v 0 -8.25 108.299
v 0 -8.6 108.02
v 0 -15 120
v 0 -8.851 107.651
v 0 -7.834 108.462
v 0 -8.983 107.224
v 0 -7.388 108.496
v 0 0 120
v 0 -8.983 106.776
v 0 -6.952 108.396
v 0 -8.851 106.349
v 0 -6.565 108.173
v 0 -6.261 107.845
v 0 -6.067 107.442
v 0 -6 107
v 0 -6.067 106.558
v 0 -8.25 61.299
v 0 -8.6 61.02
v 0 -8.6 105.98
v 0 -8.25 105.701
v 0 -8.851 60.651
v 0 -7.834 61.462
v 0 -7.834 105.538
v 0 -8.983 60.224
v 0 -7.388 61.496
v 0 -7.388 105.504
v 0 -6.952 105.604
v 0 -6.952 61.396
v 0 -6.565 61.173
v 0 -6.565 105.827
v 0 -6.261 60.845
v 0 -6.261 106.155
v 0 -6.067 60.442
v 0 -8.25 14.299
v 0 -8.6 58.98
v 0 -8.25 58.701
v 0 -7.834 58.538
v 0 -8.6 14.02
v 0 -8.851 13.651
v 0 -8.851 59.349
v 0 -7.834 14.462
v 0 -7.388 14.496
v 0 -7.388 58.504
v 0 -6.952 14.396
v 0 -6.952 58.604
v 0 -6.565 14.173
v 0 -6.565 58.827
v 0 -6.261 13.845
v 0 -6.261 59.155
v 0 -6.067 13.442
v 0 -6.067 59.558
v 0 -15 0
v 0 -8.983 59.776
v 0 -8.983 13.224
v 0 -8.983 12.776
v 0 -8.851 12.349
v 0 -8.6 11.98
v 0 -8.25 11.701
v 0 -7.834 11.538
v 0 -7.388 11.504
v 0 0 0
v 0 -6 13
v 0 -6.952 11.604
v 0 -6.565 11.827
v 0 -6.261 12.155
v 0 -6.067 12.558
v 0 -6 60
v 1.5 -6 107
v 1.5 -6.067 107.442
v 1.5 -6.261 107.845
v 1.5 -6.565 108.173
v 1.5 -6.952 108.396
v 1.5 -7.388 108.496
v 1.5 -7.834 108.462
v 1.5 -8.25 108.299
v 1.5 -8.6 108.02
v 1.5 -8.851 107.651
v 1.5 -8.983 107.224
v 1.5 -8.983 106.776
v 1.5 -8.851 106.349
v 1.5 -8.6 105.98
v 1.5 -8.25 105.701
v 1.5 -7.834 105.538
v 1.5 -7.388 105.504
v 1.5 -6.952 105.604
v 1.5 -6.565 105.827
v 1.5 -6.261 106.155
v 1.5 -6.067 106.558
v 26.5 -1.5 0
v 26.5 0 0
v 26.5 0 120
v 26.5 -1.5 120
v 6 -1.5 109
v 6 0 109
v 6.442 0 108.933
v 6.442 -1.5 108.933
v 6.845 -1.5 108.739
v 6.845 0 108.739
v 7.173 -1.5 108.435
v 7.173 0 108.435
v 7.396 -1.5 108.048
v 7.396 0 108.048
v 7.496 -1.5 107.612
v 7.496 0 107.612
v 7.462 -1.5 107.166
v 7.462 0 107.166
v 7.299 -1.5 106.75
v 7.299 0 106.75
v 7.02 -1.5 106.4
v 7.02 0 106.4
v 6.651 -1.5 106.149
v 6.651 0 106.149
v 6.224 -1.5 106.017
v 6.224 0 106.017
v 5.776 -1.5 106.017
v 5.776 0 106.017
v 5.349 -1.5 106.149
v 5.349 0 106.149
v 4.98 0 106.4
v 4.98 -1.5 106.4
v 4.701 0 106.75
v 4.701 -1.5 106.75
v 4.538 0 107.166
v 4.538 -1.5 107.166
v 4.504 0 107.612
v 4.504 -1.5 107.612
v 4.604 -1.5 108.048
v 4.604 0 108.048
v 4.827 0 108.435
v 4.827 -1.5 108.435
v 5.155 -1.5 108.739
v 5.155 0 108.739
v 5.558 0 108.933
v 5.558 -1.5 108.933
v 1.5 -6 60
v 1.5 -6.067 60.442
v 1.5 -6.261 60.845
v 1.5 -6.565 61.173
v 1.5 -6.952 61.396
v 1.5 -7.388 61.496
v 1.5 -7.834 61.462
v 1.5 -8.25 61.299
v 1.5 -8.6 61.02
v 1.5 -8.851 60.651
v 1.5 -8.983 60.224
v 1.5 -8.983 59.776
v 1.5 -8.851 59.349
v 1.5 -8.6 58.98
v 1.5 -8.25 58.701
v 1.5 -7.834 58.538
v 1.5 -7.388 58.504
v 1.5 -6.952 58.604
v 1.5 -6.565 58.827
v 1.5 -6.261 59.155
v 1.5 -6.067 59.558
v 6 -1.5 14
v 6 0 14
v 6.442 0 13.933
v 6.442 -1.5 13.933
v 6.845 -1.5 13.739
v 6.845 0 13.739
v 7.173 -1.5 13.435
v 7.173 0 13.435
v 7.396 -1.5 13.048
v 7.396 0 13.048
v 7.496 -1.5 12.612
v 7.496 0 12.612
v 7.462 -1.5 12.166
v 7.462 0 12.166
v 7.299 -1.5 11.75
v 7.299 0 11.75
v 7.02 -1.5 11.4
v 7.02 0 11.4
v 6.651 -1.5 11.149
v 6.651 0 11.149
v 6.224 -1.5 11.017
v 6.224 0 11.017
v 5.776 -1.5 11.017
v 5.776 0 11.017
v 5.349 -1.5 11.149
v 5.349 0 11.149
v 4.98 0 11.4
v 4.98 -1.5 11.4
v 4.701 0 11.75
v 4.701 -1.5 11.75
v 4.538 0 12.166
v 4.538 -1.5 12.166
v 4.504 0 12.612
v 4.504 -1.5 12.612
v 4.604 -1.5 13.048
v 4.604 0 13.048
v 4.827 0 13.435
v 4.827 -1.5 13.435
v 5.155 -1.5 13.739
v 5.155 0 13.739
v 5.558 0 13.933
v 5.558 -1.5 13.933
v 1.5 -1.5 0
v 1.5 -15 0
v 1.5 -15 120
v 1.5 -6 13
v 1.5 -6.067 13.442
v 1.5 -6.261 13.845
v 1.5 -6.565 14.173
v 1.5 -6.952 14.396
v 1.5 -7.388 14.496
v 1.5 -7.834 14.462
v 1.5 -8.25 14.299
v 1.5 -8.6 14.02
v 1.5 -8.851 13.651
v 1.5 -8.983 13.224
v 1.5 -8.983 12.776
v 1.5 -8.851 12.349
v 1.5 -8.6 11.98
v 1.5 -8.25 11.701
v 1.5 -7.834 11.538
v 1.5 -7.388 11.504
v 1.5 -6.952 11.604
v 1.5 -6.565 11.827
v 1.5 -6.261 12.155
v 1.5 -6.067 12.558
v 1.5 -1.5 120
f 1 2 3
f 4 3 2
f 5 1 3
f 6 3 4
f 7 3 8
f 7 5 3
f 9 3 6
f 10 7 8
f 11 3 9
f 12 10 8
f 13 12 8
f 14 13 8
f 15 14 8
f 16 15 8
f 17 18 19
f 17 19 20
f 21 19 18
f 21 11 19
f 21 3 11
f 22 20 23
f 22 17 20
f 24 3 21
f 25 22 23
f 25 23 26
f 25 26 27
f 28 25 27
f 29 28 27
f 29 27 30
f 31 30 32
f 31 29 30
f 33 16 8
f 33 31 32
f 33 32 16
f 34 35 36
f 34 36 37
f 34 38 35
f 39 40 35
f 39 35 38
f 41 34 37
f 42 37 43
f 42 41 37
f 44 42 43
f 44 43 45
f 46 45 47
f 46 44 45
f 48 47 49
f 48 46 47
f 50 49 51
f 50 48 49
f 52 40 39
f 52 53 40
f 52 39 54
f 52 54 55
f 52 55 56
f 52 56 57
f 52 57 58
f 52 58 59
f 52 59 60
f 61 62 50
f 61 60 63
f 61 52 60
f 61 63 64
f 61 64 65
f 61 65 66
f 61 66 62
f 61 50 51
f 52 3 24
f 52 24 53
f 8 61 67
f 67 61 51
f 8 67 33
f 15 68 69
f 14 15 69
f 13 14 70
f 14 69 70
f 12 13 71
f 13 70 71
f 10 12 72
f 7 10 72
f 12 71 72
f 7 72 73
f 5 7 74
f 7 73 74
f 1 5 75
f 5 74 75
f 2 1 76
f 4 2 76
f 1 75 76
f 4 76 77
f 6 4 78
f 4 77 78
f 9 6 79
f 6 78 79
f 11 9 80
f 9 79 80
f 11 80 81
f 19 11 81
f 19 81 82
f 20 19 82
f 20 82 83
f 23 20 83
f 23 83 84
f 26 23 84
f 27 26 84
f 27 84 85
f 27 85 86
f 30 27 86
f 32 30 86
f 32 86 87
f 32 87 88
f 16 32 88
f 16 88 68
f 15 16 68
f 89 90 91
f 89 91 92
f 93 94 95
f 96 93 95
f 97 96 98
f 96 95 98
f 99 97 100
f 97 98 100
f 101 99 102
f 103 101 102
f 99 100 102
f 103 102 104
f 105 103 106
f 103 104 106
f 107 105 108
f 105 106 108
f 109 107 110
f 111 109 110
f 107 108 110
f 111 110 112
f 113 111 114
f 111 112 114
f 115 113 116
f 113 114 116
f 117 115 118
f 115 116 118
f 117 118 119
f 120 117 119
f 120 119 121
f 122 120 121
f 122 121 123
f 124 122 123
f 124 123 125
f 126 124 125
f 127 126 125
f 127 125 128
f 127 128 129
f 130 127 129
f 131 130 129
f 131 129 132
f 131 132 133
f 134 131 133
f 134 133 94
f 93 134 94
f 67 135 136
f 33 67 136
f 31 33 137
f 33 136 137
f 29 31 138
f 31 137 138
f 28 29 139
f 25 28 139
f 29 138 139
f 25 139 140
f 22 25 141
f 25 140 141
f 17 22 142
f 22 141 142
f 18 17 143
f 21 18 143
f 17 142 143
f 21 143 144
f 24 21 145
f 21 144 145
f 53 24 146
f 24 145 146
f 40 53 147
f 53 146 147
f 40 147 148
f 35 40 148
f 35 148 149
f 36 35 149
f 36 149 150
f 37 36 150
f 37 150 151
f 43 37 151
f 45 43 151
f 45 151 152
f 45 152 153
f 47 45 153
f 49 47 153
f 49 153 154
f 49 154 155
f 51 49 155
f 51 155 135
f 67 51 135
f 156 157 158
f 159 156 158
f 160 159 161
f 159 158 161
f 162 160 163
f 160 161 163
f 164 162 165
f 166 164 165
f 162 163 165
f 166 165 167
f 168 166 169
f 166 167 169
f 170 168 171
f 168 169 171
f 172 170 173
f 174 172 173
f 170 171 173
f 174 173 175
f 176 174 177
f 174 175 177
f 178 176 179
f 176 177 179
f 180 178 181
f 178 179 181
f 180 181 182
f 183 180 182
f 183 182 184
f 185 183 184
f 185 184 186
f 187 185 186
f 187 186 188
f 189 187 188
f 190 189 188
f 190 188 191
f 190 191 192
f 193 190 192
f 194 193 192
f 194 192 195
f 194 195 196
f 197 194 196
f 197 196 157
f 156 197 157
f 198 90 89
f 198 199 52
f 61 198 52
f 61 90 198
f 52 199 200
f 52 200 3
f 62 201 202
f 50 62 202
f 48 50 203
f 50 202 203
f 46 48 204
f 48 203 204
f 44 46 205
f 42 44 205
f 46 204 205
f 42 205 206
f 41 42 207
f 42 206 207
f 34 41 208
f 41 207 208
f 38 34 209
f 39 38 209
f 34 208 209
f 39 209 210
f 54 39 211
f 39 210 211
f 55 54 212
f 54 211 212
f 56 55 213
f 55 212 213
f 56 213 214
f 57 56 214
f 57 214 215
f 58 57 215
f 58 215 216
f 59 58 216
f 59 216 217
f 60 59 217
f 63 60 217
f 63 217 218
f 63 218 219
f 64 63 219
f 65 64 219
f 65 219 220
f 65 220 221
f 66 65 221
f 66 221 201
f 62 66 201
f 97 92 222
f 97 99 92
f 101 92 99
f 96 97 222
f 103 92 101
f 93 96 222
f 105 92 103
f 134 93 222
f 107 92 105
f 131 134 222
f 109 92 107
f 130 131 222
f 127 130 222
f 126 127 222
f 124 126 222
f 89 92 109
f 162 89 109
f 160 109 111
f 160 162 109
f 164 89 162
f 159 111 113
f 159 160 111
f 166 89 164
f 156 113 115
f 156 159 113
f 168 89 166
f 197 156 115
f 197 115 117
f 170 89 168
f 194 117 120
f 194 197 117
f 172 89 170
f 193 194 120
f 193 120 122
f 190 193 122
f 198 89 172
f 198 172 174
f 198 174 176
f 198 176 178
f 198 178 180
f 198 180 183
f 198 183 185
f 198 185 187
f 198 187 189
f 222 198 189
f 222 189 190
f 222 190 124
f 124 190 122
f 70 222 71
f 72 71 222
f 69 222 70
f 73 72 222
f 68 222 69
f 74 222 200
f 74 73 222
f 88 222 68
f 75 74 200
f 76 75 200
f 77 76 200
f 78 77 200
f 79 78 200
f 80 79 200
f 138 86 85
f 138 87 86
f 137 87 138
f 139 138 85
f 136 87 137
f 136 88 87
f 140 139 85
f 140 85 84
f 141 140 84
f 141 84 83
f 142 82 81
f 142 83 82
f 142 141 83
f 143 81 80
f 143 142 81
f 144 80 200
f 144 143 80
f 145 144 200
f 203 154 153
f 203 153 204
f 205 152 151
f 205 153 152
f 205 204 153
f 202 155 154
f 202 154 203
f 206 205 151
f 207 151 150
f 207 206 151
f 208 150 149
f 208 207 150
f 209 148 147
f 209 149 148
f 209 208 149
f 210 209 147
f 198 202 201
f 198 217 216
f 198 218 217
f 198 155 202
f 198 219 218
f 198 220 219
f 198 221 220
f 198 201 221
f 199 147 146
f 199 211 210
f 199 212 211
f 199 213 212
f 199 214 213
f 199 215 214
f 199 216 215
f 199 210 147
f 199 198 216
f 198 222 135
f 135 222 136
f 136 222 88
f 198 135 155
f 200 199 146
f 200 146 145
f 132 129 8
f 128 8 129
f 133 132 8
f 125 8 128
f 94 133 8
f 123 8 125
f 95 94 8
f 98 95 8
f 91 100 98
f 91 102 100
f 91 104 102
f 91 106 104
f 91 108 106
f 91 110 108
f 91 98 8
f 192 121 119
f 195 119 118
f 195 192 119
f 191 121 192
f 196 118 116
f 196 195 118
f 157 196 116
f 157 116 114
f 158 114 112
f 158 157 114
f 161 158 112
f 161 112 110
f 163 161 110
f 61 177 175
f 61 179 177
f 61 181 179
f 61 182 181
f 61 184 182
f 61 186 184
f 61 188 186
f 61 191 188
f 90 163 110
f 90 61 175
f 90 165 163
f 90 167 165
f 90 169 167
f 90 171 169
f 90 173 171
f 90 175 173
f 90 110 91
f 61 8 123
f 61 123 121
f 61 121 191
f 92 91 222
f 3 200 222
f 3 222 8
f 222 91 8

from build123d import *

# Parameters (mm, degrees)
EXTRUDE_1_DEPTH     = 120
SKETCH_2_R          = 1.5
CUT_EXTRUDE_1_DEPTH = 124.490890352
SKETCH_3_R          = 1.5
CUT_EXTRUDE_2_DEPTH = 124.803271362


with BuildPart() as part:
    # 草图1 → 凸台-拉伸1 (new body)
    with BuildSketch(Plane.XY):
        Polygon((0, 0), (26.5, 0), (26.5, -1.5), (1.5, -1.5), (1.5, -15), (0, -15), align=None)
    extrude(amount=EXTRUDE_1_DEPTH)

    # 草图2 → 切除-拉伸1 (cut, through all)
    with BuildSketch(Plane(origin=(1.5, 0, 0), x_dir=(0, 0, -1), z_dir=(1, 0, 0))):
        with Locations(Location((-60, -7.5, 0), (0, 0, 90))):
            Circle(SKETCH_2_R)
        with Locations(Location((-107, -7.5, 0), (0, 0, 90))):
            Circle(SKETCH_2_R)
        with Locations(Location((-13, -7.5, 0), (0, 0, 90))):
            Circle(SKETCH_2_R)
    extrude(amount=-CUT_EXTRUDE_1_DEPTH, mode=Mode.SUBTRACT)

    # 草图3 → 切除-拉伸2 (cut, through all)
    with BuildSketch(Plane(origin=(0, 0, 0), x_dir=(1, 0, 0), z_dir=(0, 1, 0))):
        with Locations(Location((6, -107.5, 0), (0, 0, 270))):
            Circle(SKETCH_3_R)
        with Locations(Location((6, -12.5, 0), (0, 0, 270))):
            Circle(SKETCH_3_R)
    extrude(amount=-CUT_EXTRUDE_2_DEPTH, mode=Mode.SUBTRACT)


solid = part.part
